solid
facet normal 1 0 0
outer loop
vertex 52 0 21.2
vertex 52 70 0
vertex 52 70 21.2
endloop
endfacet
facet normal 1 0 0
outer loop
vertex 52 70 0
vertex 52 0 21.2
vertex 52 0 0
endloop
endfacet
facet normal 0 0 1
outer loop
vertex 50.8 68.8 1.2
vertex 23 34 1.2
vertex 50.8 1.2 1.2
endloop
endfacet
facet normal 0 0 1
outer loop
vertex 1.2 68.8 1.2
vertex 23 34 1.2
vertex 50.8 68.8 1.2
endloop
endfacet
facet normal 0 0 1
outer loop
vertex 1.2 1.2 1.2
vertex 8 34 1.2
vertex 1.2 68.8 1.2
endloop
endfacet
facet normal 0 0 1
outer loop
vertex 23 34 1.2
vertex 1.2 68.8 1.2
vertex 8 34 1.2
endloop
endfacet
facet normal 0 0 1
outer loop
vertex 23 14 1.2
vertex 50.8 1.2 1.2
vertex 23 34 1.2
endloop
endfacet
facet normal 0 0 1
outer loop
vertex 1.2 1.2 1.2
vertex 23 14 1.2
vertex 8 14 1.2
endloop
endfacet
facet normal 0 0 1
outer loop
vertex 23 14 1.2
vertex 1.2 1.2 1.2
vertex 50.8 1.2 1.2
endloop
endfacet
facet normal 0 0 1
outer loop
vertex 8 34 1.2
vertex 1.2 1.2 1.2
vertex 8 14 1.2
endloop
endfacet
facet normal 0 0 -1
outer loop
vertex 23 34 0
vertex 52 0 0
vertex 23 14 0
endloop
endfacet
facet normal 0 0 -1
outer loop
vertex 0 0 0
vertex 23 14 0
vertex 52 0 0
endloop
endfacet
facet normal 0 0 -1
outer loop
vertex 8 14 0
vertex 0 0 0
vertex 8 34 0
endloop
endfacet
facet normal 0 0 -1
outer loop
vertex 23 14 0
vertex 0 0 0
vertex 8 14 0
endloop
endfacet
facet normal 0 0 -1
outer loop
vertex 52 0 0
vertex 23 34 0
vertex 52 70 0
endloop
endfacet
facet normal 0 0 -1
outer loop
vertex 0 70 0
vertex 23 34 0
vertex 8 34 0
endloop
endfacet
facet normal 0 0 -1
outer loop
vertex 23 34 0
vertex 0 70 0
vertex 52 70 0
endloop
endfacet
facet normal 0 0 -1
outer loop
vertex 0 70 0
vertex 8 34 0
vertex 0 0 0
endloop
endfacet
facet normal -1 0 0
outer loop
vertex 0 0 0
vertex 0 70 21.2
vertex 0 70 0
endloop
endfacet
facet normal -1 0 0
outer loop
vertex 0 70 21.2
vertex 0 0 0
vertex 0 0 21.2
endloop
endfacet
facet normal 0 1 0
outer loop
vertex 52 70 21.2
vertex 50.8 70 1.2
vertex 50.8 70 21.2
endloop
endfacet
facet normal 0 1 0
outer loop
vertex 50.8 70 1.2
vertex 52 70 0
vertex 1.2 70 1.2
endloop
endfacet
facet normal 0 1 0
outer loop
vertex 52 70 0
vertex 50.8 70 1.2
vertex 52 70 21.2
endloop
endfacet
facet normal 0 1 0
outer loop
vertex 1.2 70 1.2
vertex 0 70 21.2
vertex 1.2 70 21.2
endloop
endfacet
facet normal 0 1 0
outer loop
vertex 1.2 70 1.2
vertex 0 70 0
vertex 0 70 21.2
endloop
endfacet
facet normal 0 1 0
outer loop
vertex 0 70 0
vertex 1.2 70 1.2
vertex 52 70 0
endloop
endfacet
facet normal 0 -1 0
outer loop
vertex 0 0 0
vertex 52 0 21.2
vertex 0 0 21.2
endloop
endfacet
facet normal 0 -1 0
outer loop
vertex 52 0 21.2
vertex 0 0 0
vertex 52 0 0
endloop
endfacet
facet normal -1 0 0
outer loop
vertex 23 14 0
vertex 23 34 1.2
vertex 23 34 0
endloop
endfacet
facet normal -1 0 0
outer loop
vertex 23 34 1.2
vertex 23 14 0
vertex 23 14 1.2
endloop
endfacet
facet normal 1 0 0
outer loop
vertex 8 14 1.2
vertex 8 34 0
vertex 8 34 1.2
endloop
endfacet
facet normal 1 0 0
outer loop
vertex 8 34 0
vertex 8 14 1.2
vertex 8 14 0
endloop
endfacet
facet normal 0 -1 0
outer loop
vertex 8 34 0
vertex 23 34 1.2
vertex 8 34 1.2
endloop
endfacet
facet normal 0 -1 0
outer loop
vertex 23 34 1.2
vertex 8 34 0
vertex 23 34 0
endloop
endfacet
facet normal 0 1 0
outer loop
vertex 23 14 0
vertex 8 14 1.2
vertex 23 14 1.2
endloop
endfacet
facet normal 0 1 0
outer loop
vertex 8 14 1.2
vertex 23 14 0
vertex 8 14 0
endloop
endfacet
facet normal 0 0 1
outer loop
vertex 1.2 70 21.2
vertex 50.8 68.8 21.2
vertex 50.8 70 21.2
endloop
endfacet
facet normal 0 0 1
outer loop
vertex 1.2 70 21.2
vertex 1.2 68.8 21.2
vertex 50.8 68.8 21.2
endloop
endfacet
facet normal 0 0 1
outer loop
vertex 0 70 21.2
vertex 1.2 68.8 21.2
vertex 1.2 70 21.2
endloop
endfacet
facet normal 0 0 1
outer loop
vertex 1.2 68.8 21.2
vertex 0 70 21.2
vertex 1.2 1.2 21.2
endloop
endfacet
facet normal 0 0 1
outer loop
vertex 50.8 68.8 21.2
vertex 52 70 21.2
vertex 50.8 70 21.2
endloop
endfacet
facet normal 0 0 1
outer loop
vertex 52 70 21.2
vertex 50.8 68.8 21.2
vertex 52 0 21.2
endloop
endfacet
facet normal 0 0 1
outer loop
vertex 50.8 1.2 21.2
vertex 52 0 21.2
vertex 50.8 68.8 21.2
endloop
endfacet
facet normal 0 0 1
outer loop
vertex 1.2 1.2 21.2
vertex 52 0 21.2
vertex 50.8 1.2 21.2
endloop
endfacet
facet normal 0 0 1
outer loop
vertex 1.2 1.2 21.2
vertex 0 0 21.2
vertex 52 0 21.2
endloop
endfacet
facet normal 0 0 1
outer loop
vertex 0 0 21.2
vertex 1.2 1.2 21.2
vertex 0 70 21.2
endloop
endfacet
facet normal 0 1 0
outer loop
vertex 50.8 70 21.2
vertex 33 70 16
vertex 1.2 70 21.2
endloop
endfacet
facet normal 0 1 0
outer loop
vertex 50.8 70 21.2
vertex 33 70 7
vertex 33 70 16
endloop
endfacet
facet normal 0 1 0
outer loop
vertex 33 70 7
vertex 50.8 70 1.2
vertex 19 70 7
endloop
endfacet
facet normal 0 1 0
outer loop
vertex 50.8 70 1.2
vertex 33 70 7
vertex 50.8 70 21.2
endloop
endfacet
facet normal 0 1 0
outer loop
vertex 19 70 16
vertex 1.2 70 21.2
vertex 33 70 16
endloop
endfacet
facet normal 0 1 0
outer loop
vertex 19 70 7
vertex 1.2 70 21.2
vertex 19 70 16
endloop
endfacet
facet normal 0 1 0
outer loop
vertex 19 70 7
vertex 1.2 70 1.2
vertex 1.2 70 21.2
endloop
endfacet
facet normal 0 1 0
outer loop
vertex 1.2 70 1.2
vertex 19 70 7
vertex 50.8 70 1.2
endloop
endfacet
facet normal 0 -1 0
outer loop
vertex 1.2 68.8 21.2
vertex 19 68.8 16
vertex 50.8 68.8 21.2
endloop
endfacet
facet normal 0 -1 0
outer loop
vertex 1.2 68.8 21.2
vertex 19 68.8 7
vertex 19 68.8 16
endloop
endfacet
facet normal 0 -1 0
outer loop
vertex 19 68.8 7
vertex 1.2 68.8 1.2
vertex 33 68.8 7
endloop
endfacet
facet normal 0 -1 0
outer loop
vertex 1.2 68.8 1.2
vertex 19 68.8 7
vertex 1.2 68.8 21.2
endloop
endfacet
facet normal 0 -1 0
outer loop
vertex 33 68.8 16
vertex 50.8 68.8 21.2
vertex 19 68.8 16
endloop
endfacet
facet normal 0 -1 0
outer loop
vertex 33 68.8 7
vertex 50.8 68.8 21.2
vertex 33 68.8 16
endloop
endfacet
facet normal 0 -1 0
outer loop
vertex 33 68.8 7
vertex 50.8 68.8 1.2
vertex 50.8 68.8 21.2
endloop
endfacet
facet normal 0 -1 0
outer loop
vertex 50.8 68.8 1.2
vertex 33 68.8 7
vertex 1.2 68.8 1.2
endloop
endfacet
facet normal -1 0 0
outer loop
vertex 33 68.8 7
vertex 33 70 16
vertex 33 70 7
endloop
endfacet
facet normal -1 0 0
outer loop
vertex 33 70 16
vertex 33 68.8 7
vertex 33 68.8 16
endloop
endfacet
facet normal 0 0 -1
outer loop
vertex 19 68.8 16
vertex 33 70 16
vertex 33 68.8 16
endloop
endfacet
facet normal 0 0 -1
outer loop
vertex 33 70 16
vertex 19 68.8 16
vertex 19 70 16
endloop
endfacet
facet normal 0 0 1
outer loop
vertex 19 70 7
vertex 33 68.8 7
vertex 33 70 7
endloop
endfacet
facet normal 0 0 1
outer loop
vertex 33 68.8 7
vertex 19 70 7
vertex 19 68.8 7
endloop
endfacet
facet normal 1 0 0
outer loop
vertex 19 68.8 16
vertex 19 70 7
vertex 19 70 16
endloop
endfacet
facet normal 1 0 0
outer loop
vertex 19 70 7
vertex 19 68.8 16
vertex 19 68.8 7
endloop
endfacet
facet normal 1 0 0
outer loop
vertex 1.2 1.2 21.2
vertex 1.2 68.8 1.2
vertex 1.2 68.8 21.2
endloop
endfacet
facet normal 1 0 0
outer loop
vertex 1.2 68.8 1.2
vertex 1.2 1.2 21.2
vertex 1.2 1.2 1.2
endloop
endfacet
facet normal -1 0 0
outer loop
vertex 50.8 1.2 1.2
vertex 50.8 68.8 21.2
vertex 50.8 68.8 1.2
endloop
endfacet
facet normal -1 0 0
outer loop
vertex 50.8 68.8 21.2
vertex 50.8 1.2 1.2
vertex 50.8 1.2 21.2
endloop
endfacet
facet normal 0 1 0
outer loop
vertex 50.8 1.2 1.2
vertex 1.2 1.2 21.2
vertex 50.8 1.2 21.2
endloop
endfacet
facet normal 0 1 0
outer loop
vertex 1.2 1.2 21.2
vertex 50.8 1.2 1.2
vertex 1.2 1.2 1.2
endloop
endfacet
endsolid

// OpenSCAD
/* cap_cpuplate */

// 2018/6/5  15:35   usui
t=1.2;
h=52;
w=70;

//base-plate
module baseplate(h,w,t) {
    difference() {
        cube([h,w,t]);
        // LCD hole
        translate([8,14,0])      cube([15,20,20]);
    }
    

    //wall
    wt=t+20;
    translate([0,0,0])  cube([t,w,wt]);


    translate([h-t,0,0])  cube([t,w,wt]);
    
    translate([0,w-t,0]) 
        difference() {
            cube([h,t,wt]);
            translate([19,-2,7]) cube([14,12,9]); //USB
        }
    
    translate([0,0,0])  cube([h,t,wt]);


    //table
    //translate([h/2-4,w-t-5,0]) cube([10,5,3]);
};



//post
baseplate(h,w,t);
